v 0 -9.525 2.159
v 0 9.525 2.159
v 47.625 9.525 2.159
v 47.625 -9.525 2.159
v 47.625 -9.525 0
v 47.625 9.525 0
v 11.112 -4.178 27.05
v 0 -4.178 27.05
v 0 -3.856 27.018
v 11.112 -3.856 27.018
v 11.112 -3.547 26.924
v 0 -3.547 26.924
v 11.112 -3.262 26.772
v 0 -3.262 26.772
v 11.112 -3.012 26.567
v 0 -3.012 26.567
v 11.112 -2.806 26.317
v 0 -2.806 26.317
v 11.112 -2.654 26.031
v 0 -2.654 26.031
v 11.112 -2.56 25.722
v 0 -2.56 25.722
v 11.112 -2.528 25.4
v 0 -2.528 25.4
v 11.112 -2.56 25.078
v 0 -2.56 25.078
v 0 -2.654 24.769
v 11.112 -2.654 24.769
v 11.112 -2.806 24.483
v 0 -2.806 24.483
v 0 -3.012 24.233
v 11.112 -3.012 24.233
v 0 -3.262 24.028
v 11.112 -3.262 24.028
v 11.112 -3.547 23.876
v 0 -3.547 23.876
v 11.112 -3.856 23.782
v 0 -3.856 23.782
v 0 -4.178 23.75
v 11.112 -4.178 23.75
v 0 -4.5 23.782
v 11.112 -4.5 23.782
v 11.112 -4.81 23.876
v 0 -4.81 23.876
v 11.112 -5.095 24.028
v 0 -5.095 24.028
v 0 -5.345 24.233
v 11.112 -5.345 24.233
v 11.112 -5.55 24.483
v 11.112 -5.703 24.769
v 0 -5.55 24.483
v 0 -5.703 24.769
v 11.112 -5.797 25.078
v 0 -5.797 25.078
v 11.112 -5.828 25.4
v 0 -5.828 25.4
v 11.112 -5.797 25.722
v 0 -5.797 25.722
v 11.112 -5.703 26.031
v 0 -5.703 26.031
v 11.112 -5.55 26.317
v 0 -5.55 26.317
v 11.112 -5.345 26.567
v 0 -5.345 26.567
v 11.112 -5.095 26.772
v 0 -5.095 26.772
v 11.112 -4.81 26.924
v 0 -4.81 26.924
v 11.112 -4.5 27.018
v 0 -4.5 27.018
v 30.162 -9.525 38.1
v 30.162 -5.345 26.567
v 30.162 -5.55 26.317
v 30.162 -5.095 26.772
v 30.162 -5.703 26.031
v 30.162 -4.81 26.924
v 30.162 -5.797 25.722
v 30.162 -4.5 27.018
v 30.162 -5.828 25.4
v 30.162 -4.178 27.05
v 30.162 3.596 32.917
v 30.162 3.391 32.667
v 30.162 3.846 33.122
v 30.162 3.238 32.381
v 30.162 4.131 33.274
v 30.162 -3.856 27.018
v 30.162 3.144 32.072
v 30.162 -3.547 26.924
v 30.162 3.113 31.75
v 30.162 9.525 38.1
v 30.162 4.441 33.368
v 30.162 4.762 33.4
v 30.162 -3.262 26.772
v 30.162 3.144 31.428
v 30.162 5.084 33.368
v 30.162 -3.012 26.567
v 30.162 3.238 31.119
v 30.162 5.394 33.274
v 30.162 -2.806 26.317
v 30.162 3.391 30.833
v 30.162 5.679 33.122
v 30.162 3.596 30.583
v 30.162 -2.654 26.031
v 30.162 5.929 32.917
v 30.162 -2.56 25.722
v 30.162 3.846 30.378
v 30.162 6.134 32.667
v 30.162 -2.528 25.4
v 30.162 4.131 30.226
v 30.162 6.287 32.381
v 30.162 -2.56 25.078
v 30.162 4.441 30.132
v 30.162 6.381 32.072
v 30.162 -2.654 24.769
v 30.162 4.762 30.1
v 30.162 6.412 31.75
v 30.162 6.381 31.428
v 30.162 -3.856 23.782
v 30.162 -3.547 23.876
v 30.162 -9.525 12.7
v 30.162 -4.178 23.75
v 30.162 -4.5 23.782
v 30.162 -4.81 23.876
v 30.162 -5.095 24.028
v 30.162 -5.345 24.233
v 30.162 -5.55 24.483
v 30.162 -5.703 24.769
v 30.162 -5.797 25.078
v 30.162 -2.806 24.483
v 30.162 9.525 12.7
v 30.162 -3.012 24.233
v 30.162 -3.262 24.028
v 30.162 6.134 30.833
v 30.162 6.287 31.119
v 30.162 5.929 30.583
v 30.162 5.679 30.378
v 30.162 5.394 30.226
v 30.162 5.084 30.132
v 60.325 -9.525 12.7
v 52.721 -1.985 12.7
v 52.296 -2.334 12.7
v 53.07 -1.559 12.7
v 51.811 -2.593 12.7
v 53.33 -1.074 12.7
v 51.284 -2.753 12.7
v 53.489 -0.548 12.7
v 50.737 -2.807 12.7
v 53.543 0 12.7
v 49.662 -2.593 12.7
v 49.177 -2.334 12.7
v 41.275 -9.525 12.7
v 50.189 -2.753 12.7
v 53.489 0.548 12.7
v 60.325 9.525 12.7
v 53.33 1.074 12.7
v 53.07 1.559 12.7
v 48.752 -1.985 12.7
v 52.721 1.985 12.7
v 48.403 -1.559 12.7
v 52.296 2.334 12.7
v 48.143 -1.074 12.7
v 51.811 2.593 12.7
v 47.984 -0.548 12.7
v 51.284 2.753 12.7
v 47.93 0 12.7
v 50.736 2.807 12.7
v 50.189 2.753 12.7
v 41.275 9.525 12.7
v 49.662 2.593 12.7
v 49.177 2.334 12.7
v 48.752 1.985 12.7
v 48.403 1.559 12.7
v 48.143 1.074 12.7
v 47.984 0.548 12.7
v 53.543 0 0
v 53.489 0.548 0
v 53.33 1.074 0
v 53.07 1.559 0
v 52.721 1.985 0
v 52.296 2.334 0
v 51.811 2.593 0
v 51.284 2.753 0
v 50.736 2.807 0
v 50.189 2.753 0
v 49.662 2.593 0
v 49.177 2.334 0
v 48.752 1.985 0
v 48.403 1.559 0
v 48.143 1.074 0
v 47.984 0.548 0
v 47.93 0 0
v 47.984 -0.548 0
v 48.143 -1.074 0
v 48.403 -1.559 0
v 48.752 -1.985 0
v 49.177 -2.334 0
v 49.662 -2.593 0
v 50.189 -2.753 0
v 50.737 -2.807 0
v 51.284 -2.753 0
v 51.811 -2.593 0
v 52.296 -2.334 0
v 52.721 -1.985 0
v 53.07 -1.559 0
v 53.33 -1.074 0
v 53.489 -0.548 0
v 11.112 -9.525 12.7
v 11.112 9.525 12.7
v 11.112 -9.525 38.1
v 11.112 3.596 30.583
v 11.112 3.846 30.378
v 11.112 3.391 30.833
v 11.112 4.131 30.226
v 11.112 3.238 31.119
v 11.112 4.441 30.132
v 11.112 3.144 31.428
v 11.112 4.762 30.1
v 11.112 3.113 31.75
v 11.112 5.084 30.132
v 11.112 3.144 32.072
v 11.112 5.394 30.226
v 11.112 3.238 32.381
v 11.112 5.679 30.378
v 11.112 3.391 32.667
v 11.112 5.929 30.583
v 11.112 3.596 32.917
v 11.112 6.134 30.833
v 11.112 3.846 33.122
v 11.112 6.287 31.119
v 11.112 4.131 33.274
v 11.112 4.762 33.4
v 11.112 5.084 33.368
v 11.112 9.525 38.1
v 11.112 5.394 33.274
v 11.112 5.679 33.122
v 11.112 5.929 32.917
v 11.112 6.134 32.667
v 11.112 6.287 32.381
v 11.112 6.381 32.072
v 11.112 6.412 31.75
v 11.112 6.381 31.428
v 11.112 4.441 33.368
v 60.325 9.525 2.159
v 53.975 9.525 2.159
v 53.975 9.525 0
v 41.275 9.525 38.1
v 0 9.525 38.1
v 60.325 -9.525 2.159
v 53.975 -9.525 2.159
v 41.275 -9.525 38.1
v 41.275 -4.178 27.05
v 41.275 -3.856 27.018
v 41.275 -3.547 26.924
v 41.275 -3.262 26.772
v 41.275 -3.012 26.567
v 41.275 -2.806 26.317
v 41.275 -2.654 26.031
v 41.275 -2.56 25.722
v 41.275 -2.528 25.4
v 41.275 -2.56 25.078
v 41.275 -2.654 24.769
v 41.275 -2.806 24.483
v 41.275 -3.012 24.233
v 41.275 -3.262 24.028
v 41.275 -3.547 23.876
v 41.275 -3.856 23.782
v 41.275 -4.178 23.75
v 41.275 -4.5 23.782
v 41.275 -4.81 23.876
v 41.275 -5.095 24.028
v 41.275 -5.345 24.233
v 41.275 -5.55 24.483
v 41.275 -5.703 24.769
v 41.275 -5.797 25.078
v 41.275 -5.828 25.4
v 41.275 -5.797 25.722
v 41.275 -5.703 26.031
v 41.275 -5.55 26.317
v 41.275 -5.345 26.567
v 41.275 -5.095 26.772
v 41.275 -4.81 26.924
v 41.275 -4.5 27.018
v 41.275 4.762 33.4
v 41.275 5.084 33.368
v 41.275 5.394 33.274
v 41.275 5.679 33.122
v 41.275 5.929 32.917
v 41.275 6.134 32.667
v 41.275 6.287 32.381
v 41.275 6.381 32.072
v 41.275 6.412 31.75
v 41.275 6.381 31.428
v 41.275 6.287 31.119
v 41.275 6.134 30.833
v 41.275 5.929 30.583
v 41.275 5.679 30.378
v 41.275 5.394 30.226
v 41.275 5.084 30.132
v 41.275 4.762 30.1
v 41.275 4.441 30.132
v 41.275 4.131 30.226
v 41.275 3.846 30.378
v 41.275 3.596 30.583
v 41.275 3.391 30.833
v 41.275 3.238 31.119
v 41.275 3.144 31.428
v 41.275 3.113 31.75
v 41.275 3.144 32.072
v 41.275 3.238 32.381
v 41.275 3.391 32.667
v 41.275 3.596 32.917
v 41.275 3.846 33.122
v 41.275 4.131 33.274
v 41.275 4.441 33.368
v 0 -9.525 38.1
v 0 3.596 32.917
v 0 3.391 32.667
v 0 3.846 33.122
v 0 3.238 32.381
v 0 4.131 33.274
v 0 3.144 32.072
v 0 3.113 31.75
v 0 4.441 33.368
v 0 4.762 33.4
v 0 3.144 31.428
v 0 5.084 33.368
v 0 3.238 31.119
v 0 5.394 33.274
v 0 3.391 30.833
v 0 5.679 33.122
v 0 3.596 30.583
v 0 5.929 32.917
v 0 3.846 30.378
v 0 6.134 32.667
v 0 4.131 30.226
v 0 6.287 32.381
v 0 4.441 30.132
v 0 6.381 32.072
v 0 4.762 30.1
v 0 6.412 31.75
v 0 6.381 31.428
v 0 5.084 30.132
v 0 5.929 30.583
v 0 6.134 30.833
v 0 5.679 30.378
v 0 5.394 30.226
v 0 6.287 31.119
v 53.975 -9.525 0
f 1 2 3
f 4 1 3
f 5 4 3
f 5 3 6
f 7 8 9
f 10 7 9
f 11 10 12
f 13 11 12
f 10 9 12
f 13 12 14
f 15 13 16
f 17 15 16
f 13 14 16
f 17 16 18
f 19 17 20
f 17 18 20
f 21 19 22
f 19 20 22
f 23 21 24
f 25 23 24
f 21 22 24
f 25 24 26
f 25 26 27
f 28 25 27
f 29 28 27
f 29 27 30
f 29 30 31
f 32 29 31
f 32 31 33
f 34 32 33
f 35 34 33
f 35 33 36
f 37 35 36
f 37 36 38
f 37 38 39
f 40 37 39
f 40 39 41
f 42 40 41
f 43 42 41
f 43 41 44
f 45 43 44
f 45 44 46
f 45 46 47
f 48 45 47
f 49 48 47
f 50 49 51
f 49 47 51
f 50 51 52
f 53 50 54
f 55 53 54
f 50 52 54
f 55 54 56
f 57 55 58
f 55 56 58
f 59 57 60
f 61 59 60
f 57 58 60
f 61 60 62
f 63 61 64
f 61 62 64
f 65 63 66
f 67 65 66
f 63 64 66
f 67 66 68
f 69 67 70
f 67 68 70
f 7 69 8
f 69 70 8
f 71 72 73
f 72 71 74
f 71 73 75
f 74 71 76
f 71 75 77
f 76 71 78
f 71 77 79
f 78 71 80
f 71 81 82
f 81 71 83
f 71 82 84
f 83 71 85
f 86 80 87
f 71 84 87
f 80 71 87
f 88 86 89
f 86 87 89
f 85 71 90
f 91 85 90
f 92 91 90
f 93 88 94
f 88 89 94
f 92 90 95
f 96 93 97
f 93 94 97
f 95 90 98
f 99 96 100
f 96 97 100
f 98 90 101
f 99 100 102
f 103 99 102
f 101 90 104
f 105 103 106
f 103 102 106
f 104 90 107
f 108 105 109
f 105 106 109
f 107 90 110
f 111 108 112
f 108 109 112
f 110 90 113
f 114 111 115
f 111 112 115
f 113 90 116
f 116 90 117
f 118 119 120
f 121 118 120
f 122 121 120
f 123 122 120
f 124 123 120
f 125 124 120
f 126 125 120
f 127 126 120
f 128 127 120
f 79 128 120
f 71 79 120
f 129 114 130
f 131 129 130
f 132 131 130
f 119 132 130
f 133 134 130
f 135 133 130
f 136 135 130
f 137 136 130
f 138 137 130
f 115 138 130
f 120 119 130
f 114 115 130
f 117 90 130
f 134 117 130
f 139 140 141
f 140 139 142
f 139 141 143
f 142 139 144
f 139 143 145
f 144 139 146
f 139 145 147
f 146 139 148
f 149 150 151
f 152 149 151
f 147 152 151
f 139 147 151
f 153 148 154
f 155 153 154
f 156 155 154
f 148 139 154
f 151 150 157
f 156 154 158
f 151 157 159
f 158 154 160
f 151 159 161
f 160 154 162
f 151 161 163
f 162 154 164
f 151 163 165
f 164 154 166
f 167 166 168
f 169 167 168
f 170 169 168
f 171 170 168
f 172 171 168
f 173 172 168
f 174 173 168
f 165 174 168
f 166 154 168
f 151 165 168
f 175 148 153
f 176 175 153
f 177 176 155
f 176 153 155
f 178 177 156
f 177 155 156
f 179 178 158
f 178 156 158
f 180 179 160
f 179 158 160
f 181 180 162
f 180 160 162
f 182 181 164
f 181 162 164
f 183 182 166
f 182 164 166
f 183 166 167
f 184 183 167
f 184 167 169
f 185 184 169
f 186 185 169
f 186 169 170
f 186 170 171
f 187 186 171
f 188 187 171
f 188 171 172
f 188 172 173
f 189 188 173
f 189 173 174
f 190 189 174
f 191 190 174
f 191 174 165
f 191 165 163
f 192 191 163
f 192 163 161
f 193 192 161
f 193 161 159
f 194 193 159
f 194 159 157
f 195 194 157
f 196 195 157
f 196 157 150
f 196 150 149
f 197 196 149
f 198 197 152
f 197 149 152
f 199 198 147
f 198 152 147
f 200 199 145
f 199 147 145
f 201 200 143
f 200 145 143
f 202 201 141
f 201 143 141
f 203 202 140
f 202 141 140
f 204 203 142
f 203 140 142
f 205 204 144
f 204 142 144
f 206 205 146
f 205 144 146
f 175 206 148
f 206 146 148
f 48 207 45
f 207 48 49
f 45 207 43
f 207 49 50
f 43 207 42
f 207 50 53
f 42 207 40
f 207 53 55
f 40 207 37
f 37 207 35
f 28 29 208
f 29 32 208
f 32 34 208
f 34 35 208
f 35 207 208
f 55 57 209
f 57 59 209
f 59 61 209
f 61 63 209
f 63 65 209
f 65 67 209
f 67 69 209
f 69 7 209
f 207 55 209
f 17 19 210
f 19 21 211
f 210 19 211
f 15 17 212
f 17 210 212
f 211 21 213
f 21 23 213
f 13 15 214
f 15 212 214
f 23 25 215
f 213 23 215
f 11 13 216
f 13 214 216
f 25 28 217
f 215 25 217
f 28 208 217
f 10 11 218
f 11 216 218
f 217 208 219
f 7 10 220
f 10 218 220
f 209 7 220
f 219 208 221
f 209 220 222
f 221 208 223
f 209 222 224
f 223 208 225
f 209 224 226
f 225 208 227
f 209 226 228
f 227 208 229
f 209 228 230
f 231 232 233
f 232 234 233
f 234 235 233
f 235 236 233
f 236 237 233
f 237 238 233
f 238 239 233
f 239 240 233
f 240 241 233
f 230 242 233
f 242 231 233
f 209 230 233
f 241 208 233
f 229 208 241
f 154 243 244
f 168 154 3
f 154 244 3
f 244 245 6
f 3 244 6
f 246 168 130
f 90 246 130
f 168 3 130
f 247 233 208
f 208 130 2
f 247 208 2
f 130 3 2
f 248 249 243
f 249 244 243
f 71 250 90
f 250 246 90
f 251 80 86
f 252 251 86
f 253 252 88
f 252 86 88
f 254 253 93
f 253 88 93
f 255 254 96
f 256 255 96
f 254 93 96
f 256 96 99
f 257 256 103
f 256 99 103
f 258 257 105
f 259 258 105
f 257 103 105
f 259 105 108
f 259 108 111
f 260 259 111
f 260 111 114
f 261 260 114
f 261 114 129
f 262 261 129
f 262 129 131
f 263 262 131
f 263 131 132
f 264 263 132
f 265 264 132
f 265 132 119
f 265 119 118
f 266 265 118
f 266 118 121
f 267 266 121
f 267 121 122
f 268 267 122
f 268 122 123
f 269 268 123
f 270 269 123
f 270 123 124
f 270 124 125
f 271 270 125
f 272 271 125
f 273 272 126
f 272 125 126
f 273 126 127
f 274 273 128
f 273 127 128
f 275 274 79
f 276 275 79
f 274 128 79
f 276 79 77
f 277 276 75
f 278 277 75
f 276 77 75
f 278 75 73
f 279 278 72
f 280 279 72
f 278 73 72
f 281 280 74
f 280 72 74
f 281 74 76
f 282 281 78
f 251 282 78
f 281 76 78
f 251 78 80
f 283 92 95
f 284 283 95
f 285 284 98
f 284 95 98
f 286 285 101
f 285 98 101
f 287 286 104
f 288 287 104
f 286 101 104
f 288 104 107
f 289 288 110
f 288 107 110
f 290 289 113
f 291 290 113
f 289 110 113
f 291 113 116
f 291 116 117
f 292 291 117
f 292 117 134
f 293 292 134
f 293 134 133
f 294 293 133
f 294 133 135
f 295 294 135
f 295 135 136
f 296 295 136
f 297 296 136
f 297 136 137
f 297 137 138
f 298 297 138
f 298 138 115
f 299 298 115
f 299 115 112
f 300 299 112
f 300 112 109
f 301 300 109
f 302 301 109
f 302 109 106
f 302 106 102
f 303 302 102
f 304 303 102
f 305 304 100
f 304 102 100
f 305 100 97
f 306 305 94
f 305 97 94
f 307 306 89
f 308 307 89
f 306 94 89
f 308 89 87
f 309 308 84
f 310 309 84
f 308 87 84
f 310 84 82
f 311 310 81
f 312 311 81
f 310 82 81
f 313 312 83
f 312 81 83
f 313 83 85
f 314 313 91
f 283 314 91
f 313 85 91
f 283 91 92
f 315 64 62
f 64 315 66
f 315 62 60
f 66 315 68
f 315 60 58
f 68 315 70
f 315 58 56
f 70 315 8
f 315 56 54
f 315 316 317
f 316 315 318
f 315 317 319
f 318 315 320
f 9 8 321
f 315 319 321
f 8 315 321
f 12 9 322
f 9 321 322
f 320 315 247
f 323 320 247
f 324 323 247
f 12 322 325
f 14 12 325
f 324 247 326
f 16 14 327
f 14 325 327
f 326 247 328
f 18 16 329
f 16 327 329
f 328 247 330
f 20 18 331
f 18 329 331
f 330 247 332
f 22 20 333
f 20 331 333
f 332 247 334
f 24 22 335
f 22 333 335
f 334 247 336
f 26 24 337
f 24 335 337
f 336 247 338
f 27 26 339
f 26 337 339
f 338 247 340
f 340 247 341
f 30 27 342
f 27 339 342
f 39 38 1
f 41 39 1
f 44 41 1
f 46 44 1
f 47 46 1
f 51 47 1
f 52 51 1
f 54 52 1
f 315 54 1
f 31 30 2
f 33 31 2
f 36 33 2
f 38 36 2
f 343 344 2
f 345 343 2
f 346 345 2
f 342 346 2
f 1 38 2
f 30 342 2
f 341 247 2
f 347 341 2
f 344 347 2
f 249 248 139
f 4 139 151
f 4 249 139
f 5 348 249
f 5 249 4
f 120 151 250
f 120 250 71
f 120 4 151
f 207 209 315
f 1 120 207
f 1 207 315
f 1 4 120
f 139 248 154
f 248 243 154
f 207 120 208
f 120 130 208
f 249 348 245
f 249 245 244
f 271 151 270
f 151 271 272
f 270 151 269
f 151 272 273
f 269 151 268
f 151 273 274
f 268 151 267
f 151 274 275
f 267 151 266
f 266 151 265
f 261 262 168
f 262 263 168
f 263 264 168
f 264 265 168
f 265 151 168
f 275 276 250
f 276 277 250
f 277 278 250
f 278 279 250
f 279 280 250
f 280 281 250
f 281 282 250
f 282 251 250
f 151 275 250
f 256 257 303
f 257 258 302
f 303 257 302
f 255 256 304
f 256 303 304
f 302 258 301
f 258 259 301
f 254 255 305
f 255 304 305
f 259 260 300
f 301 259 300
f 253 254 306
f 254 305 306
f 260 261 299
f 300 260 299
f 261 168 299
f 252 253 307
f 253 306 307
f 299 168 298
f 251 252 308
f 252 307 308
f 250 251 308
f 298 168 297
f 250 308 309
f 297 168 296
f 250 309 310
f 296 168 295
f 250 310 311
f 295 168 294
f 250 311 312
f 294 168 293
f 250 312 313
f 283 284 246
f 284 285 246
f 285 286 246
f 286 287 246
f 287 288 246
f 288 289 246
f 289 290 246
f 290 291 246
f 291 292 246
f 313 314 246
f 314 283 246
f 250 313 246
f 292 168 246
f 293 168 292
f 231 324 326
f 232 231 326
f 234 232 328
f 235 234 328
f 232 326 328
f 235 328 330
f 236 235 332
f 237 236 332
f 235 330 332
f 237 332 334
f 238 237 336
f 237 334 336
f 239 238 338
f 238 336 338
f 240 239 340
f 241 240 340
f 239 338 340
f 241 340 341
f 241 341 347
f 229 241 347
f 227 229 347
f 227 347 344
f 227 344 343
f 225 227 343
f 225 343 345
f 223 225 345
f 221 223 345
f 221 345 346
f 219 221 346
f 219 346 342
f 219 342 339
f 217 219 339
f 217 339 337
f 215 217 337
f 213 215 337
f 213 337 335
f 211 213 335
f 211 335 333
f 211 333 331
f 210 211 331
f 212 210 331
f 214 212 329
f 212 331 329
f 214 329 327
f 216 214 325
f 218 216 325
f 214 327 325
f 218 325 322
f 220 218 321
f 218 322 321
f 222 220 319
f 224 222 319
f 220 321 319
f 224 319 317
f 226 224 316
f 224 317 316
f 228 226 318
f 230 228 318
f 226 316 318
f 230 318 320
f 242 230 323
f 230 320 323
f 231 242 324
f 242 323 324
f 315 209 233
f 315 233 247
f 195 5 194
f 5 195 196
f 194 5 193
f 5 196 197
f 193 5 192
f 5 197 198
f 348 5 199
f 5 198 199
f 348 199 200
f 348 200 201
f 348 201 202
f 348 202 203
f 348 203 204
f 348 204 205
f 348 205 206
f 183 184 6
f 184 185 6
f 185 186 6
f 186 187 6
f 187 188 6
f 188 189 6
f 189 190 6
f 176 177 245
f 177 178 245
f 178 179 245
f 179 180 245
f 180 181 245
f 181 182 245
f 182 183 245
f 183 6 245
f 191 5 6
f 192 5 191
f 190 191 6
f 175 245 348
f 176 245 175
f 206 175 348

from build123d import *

# Parameters (mm, degrees)
EXTRUDE1_DEPTH         = 9.525
M4X0_7_TAPPED_HOLE1_D  = 3.3
F_10_CLEARANCE_HOLE1_D = 5.6134


with BuildPart() as part:
    # Sketch1 → Extrude1 (new, symmetric)
    with BuildSketch(Plane(origin=(0, 0, 0), x_dir=(1, 0, 0), z_dir=(0, 1, 0))):
        Polygon((47.625, 0), (53.975, 0), (53.975, -2.159), (60.325, -2.159), (60.325, -12.7), (41.275, -12.7), (41.275, -38.1), (30.1625, -38.1), (30.1625, -12.7), (11.1125, -12.7), (11.1125, -38.1), (0, -38.1), (0, -2.159), (47.625, -2.159), align=None)
    extrude(amount=EXTRUDE1_DEPTH, both=True)

    # M4x0.7 Tapped Hole1 (through all)
    with Locations(Plane(origin=(41.275, 0, 0), x_dir=(0, 0, -1), z_dir=(1, 0, 0))):
        with Locations((-31.75, 4.7625), (-25.4, -4.1783)):
            Hole(M4X0_7_TAPPED_HOLE1_D / 2)

    # #10 Clearance Hole1 (through all)
    with Locations(Plane(origin=(0, 0, 0), x_dir=(-1, 0, 0), z_dir=(0, 0, -1))):
        with Locations((-50.7365, 0)):
            Hole(F_10_CLEARANCE_HOLE1_D / 2)


solid = part.part
